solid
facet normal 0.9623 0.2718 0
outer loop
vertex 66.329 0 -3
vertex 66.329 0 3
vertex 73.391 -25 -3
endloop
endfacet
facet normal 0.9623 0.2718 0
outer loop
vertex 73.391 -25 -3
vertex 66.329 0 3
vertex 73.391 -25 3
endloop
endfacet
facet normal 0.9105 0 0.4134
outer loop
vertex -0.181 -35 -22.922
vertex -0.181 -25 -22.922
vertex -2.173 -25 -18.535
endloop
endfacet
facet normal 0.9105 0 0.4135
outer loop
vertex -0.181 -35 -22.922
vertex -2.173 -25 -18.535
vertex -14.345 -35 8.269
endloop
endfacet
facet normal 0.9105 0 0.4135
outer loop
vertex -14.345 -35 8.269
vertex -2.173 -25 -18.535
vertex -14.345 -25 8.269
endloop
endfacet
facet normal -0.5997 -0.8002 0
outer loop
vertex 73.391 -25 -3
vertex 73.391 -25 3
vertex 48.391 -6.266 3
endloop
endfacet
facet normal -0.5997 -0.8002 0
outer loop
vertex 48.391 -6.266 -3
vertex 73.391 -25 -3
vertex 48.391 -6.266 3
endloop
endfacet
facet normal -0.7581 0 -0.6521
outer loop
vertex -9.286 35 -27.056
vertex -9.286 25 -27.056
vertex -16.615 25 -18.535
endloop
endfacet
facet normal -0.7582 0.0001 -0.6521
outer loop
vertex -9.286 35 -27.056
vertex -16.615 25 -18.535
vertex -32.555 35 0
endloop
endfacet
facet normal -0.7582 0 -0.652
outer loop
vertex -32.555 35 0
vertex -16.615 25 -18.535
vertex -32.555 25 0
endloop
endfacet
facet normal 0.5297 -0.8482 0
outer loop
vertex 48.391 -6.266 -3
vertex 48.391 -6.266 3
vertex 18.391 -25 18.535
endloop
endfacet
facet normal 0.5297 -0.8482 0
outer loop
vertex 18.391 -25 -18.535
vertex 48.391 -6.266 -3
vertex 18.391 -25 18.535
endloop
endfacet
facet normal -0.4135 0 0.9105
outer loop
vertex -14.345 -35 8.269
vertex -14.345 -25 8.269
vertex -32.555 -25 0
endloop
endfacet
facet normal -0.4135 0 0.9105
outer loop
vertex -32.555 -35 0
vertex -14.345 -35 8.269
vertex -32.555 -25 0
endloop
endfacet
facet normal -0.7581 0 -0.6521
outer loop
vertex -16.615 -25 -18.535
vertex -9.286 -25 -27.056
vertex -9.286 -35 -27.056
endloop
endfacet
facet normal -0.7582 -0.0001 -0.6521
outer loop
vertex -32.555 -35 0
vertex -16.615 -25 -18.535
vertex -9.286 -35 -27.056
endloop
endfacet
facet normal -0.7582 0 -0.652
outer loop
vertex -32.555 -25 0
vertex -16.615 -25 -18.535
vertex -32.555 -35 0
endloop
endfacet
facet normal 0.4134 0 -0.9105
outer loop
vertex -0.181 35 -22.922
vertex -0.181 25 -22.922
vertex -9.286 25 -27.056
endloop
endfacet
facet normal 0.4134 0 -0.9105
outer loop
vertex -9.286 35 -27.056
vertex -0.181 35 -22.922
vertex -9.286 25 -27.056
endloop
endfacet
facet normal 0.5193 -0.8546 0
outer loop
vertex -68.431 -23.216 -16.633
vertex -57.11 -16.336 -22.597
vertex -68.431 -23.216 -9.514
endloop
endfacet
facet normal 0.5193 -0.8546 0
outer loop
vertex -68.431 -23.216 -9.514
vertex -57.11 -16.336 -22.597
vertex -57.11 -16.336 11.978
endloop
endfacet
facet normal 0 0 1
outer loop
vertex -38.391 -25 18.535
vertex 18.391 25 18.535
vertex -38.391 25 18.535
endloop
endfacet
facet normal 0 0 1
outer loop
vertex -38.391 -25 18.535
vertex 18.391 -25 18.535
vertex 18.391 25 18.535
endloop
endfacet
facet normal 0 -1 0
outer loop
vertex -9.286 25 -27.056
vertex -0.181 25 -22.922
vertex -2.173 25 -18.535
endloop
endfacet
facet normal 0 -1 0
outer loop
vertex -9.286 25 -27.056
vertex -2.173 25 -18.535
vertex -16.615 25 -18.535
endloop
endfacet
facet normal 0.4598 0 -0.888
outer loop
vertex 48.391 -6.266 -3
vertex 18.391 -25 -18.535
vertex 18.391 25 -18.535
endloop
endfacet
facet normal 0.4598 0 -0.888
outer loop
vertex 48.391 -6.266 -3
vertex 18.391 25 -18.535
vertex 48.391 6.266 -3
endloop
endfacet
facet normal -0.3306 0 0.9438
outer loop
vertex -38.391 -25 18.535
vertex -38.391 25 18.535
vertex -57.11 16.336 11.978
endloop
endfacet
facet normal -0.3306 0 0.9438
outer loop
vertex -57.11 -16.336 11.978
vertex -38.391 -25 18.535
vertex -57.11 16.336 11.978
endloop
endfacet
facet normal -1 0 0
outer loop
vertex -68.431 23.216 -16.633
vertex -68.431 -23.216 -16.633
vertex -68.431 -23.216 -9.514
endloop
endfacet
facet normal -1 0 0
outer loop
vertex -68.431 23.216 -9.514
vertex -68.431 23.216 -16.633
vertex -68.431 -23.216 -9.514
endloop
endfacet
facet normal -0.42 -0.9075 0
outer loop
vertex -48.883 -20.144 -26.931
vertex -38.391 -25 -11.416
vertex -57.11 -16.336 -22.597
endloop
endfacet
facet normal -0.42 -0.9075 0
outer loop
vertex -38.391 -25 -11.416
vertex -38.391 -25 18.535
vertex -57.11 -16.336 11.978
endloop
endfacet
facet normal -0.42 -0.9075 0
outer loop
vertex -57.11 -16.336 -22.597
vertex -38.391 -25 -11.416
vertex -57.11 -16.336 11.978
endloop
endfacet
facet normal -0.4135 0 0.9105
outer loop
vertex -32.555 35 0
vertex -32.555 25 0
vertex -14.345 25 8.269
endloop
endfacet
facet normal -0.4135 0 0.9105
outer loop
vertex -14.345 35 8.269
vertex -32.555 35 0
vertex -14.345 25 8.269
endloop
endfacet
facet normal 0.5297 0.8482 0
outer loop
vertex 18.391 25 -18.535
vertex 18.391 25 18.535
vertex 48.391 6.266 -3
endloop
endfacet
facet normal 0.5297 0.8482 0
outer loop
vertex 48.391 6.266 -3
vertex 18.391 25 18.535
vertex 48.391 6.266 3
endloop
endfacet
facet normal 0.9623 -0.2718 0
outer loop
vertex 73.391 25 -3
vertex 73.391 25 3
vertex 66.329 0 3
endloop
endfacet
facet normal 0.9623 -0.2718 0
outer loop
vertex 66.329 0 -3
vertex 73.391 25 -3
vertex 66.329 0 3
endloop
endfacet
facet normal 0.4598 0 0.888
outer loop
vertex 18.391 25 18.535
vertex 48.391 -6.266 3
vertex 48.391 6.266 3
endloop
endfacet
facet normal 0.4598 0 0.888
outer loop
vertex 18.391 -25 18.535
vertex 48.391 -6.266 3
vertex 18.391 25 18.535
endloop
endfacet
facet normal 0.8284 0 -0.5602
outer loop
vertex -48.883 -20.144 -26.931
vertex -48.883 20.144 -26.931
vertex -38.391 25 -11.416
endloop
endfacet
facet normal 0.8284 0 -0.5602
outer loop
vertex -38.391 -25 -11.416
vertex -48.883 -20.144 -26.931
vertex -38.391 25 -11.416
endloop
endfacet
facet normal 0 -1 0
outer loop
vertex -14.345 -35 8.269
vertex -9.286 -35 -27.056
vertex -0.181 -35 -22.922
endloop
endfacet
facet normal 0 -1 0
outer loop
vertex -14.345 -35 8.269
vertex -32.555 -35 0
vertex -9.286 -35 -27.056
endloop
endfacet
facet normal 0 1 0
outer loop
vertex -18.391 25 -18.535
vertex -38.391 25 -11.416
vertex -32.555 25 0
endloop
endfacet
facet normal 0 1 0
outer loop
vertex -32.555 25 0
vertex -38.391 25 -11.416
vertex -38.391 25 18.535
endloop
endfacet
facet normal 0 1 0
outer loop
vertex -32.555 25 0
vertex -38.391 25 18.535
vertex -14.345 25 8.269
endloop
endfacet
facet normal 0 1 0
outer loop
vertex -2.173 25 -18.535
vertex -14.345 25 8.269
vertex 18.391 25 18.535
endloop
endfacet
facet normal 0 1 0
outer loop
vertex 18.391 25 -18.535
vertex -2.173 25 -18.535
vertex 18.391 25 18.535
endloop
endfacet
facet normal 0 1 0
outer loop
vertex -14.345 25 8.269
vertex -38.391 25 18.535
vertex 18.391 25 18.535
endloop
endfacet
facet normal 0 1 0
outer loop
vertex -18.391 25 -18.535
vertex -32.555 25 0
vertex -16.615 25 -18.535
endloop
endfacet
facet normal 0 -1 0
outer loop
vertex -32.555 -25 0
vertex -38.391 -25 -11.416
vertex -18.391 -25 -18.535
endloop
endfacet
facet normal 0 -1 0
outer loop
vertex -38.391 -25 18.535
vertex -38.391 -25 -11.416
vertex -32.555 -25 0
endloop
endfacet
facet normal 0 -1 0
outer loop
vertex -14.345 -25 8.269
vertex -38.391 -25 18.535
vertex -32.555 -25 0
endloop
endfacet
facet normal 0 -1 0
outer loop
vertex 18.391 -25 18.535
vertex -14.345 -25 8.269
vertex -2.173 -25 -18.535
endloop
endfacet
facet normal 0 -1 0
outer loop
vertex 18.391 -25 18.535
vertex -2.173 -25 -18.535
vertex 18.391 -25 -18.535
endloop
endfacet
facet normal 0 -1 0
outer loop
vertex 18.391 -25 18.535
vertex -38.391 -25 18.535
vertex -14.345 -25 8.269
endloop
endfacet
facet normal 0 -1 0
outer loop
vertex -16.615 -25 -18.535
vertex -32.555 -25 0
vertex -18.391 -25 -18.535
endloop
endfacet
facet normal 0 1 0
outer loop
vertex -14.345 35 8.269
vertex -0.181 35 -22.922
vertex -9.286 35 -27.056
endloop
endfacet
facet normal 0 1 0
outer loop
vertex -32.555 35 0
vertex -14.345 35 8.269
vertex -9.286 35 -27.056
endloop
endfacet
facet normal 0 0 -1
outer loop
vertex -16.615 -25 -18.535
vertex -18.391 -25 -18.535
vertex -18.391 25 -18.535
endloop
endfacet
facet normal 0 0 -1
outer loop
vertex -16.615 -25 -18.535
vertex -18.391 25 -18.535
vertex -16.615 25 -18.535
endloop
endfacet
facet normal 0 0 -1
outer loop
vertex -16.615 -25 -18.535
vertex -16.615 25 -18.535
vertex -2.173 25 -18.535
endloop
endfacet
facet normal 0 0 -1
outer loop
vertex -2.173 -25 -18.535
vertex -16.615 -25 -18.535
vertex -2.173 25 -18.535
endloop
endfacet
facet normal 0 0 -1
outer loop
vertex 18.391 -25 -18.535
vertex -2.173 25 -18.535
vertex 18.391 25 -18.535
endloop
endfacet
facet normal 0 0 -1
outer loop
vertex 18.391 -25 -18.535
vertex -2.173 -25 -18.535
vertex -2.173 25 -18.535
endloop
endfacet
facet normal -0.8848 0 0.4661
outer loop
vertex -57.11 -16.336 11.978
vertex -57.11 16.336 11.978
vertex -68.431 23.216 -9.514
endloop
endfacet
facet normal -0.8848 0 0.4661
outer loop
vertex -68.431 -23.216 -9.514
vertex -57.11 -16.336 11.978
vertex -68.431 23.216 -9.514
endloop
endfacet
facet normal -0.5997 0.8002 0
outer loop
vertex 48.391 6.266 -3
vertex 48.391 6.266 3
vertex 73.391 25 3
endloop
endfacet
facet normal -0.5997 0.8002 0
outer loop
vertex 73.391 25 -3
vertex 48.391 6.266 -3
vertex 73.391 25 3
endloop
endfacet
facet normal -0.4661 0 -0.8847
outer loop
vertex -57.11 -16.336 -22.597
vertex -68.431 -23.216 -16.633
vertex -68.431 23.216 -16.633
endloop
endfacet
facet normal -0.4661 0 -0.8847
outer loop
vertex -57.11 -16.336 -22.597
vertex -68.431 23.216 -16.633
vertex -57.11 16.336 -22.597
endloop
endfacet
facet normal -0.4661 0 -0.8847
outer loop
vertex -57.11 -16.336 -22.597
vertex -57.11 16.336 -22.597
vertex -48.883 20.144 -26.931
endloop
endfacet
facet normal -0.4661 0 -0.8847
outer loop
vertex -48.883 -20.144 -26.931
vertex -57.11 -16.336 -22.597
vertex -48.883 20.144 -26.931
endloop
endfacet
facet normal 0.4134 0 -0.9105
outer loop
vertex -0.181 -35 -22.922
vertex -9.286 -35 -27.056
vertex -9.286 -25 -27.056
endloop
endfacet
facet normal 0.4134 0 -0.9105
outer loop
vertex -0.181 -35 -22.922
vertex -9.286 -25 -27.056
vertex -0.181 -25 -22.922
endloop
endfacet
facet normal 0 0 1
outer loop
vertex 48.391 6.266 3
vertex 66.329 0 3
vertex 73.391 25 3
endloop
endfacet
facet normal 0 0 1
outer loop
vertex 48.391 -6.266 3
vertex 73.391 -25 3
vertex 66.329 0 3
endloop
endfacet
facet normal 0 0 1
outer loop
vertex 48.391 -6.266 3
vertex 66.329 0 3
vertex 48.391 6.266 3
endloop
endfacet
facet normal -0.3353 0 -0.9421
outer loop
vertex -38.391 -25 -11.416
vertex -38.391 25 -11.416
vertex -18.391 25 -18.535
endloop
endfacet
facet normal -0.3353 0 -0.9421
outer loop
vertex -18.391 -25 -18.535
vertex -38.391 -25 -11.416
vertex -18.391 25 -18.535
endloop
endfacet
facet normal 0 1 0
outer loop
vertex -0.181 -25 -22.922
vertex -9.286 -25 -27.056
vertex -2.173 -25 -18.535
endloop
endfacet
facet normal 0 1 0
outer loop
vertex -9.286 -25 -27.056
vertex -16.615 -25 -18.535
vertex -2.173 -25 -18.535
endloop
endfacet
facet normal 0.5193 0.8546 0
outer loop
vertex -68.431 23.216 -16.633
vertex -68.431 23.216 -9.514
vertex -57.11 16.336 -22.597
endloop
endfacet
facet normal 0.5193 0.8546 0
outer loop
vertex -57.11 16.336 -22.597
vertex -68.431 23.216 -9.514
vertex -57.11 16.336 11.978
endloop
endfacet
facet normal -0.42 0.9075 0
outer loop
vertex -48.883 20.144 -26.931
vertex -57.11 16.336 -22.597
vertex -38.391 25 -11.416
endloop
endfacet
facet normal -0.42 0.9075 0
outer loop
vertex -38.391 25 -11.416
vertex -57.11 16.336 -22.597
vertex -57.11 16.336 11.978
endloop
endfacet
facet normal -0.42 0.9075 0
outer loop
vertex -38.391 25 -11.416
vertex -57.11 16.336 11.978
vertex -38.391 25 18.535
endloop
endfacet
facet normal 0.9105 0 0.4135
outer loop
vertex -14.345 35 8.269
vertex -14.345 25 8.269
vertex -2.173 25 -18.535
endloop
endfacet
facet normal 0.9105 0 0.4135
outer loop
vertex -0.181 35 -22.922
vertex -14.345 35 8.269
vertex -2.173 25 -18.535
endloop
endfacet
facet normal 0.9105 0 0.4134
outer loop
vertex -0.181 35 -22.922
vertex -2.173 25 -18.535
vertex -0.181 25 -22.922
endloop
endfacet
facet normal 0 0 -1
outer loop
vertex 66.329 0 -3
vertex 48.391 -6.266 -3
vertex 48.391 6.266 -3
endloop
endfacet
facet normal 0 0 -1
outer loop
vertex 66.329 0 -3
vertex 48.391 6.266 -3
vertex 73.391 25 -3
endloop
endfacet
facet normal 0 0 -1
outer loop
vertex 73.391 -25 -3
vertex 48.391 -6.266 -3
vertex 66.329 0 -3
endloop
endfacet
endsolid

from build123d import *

# Parameters (mm, degrees)
F1_DEPTH  = 25
F2_W      = 220.380068
F2_H      = 103.423982
F3_DEPTH  = 49.4
F6_DEPTH  = 10
F8_DEPTH  = 25
F10_DEPTH = 10
F13_DEPTH = 31.3


with BuildPart() as f1:
    # F0 (on Front) → F1 (new body, symmetric)
    with BuildSketch(Plane.XZ):
        Polygon((18.391414, 18.535092), (-18.391414, 18.535092), (-38.391414, 18.535092), (-57.109501, 11.977759), (-71.366541, -15.086461), (-48.882552, -26.930701), (-38.391414, -11.416442), (-18.391414, -18.535092), (18.391414, -18.535092), (48.391414, -3), (73.391414, -3), (73.391414, 3), (48.391414, 3), align=None)
    extrude(amount=F1_DEPTH, both=True)

    # F2 (on face) → F3 (cut)
    with BuildSketch(Plane.XY.offset(18.535092)):
        with Locations((15.868798, -6.721016)):
            Rectangle(F2_W, F2_H)
        Polygon((-57.109501, -16.336106), (-71.366541, -25), (-71.366541, 25), (-57.109501, 16.336106), (-38.391414, 25), (18.391414, 25), (48.391414, 6.266106), (73.391414, 25), (66.329263, 0), (73.391414, -25), (48.391414, -6.266106), (18.391414, -25), (-38.391414, -25), align=None, mode=Mode.SUBTRACT)
    extrude(amount=-F3_DEPTH, mode=Mode.SUBTRACT)

    # F5 (on face) → F6 (join)
    with BuildSketch(Plane.XZ.offset(25)):
        Polygon((-14.344576, 8.269234), (-32.555006, 0), (-18.391414, -31.190934), (-0.180983, -22.9217), align=None)
    extrude(amount=F6_DEPTH)

    # F7 (on face) → F8 (cut)
    with BuildSketch(Plane.XZ.offset(25)):
        Polygon((-9.286198, -27.056317), (-32.555006, 0), (-27.678248, -47.243599), (-7.968015, -40.131658), align=None)
    extrude(amount=F8_DEPTH, mode=Mode.SUBTRACT)

    # F9 (on face) → F10 (join)
    with BuildSketch(Plane(origin=(0, 25, 0), x_dir=(-1, 0, 0), z_dir=(0, 1, 0))):
        Polygon((9.286198, -27.056317), (32.555006, 0), (14.344576, 8.269234), (0.180983, -22.9217), align=None)
    extrude(amount=F10_DEPTH)

    # F12 (on Front) → F13 (cut, symmetric)
    with BuildSketch(Plane.XZ):
        Polygon((-68.431303, -23.499304), (-68.431303, -4.601866), (-78.38802, -19.232141), align=None)
    extrude(amount=F13_DEPTH, both=True, mode=Mode.SUBTRACT)


solid = f1.part
